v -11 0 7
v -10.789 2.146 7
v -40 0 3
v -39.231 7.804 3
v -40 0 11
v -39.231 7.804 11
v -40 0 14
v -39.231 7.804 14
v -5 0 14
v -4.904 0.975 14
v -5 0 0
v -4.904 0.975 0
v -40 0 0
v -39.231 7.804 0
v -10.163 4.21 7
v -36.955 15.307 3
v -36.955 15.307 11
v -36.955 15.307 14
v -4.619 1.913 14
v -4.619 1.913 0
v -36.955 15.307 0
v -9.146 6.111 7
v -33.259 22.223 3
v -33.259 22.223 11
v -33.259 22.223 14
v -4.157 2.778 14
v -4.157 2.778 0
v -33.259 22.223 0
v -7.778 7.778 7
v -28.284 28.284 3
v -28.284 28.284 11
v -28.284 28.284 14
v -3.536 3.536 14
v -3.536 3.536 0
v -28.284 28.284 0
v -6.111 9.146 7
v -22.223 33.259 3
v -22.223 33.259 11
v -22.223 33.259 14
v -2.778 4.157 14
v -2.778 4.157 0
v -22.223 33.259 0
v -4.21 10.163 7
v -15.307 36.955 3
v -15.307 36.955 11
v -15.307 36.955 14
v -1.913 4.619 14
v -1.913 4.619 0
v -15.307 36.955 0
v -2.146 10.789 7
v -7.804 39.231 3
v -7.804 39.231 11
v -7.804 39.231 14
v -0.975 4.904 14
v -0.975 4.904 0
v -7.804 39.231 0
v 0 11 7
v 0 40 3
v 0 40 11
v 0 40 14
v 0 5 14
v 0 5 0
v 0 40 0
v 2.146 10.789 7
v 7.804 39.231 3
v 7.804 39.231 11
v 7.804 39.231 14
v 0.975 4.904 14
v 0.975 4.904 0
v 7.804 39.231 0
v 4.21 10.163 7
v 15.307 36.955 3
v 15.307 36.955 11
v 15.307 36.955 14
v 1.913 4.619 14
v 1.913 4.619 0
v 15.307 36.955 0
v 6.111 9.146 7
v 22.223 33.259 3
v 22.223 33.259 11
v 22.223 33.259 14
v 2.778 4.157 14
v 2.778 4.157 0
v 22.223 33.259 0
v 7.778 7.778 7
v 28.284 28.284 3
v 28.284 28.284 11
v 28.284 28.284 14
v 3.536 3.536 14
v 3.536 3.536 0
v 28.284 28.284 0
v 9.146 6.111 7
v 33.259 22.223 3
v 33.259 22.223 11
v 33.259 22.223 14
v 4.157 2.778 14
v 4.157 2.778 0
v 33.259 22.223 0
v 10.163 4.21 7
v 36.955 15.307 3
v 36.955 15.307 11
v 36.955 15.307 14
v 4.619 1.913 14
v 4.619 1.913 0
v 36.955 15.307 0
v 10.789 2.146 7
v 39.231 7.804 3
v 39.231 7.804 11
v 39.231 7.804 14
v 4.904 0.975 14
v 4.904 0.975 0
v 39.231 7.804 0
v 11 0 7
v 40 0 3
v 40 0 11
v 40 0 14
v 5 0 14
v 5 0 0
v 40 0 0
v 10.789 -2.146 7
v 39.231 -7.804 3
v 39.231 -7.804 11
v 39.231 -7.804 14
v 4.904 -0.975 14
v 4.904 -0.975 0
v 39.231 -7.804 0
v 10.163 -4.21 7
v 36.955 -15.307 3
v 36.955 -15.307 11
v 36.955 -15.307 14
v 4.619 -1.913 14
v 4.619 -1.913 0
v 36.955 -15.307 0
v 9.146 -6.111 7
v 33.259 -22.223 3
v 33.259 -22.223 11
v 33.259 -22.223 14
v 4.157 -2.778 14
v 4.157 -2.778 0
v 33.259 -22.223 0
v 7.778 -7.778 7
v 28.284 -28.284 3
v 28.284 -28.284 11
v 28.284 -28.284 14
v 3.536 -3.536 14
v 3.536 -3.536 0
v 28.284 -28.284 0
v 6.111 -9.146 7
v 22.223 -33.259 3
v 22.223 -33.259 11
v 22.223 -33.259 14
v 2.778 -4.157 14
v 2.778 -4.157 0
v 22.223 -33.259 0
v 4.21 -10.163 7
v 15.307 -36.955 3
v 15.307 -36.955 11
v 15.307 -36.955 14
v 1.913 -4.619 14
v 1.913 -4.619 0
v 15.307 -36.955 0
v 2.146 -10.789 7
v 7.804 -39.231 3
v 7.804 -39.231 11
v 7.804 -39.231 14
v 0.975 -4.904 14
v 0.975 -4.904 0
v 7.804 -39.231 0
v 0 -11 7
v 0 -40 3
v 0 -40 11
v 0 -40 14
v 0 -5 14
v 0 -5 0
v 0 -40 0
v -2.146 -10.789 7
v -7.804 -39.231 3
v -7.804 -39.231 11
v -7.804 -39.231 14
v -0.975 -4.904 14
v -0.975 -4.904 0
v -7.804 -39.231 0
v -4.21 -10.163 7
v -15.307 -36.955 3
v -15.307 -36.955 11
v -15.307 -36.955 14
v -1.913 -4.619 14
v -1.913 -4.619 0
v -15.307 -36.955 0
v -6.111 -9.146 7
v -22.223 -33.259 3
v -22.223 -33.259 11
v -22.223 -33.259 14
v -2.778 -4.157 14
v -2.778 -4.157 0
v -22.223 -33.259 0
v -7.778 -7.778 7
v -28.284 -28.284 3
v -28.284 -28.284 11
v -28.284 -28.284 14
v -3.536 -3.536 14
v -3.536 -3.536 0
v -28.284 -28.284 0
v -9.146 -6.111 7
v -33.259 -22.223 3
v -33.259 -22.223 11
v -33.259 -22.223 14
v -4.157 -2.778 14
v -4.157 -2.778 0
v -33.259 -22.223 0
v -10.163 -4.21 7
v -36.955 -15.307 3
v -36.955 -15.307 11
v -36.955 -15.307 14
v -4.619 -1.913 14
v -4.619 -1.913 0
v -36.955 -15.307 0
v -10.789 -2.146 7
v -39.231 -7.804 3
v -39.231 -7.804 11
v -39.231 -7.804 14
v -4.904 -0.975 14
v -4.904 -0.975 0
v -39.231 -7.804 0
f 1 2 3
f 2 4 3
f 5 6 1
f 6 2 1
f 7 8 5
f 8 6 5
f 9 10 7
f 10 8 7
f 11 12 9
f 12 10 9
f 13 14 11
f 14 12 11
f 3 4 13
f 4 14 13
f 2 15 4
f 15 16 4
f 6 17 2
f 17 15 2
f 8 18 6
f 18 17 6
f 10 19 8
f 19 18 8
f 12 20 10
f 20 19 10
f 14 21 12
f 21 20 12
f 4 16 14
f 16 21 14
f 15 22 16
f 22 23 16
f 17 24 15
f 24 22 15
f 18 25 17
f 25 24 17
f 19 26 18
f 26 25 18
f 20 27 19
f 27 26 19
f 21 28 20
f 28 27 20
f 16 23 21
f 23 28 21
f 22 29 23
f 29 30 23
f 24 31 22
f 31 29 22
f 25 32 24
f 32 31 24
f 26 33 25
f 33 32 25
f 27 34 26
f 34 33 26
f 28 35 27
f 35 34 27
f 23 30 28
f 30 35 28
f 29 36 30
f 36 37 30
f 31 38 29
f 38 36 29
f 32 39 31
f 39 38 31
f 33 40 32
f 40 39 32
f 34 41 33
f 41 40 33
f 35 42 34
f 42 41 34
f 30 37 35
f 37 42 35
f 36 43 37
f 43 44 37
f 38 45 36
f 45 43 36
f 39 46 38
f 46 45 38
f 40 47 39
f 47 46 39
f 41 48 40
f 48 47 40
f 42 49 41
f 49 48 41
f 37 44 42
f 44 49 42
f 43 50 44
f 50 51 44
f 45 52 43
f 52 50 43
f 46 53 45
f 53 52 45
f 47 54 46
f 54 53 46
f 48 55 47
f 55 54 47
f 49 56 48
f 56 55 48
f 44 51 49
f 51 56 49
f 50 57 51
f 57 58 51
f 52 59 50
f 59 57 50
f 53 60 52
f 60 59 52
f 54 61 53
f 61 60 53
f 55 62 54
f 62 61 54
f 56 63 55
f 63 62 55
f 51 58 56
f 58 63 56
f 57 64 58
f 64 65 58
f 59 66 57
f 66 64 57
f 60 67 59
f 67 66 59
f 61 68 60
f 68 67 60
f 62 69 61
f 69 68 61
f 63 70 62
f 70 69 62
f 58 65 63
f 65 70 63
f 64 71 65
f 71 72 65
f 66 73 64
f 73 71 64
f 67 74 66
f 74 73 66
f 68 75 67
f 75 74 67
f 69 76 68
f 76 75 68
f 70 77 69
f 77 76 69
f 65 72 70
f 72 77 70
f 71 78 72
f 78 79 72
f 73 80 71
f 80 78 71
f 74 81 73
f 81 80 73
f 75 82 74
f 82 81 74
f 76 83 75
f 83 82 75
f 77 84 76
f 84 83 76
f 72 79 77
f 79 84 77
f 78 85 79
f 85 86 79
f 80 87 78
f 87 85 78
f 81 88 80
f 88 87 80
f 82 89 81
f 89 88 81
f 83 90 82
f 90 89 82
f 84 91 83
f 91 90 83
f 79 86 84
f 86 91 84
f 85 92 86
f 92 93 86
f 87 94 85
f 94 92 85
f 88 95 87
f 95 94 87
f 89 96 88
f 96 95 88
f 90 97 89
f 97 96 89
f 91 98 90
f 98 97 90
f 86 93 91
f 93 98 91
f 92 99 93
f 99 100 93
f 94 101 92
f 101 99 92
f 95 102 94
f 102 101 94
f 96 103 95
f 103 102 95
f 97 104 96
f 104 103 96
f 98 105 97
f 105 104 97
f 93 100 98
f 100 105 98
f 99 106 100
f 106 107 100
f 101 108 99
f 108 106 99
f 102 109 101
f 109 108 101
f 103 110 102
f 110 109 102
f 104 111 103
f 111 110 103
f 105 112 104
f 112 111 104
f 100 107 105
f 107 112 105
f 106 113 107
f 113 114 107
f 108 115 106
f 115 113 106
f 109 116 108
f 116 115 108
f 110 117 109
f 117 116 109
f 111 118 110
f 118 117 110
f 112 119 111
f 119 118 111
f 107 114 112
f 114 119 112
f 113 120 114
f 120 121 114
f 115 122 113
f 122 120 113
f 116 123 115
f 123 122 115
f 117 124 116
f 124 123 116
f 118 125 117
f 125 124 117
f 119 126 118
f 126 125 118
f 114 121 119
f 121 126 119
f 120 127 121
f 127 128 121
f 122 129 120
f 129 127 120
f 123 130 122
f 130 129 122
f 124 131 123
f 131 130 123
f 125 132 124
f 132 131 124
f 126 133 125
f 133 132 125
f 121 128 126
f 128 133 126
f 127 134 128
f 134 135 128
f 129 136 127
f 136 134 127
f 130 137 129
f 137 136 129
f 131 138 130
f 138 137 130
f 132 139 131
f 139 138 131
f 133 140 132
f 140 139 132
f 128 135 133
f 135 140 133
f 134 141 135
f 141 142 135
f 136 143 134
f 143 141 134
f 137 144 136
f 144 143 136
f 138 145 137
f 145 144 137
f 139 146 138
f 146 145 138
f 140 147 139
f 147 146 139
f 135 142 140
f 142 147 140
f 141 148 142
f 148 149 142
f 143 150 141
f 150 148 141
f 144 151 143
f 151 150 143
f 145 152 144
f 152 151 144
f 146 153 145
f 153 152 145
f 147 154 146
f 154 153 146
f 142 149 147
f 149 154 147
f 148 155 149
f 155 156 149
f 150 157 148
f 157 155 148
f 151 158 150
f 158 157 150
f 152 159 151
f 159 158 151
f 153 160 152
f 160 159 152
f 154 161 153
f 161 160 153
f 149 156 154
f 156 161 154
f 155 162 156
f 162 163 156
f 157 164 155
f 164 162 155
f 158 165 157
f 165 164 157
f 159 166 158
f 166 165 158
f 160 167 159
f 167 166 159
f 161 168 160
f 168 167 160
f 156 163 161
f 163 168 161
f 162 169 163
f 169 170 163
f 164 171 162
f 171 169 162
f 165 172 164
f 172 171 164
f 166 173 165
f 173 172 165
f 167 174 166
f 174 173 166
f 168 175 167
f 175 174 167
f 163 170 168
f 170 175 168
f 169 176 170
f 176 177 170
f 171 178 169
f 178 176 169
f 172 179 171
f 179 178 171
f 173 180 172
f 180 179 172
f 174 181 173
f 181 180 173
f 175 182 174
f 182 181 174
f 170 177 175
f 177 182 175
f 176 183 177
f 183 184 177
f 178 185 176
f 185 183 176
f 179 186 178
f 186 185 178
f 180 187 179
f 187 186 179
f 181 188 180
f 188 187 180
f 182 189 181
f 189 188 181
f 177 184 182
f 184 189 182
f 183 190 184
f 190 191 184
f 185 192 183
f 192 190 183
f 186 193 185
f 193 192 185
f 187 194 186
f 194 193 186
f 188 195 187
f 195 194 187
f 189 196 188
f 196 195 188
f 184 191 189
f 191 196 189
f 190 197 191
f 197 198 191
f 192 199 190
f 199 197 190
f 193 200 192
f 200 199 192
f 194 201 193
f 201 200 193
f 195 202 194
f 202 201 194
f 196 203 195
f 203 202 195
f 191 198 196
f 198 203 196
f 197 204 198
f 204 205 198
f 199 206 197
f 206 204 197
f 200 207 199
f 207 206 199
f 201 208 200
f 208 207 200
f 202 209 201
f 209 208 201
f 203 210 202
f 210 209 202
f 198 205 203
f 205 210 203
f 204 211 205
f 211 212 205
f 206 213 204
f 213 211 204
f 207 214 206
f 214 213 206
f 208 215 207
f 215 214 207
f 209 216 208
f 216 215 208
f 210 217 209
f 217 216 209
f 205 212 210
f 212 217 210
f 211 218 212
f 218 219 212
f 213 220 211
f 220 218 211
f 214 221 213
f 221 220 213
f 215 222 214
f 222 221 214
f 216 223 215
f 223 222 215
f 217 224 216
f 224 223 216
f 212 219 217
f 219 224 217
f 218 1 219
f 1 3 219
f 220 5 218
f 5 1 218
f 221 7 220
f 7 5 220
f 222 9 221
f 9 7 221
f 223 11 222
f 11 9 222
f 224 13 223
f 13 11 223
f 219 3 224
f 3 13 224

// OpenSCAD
$fn = 32;

// ----------------------------------------------------------------------
// Revolved part: V-groove pulley R40
// ----------------------------------------------------------------------

// --- parameters (mm) ---
bore_r = 5;               // bore radius
rim_r = 40;               // rim radius
rim_t = 14;               // rim width
groove_r = 11;            // groove root radius
groove_w = 4;             // groove half width
revolve_angle = 360;      // revolve sweep, degrees
fit_tol = 0.1;            // declared fit tolerance (prompt contract)
free_tol = 0.3;           // declared free tolerance (prompt contract)

bore_d = 2 * bore_r;
rim_d = 2 * rim_r;
groove_d = 2 * groove_r;

profile = [[5, 0], [40, 0], [40, 3], [11, 7], [40, 11], [40, 14], [5, 14]];  // primary outline, 7 points, counter clockwise

// --- the one profile operation ---
rotate_extrude(angle = revolve_angle) polygon(points = profile);
